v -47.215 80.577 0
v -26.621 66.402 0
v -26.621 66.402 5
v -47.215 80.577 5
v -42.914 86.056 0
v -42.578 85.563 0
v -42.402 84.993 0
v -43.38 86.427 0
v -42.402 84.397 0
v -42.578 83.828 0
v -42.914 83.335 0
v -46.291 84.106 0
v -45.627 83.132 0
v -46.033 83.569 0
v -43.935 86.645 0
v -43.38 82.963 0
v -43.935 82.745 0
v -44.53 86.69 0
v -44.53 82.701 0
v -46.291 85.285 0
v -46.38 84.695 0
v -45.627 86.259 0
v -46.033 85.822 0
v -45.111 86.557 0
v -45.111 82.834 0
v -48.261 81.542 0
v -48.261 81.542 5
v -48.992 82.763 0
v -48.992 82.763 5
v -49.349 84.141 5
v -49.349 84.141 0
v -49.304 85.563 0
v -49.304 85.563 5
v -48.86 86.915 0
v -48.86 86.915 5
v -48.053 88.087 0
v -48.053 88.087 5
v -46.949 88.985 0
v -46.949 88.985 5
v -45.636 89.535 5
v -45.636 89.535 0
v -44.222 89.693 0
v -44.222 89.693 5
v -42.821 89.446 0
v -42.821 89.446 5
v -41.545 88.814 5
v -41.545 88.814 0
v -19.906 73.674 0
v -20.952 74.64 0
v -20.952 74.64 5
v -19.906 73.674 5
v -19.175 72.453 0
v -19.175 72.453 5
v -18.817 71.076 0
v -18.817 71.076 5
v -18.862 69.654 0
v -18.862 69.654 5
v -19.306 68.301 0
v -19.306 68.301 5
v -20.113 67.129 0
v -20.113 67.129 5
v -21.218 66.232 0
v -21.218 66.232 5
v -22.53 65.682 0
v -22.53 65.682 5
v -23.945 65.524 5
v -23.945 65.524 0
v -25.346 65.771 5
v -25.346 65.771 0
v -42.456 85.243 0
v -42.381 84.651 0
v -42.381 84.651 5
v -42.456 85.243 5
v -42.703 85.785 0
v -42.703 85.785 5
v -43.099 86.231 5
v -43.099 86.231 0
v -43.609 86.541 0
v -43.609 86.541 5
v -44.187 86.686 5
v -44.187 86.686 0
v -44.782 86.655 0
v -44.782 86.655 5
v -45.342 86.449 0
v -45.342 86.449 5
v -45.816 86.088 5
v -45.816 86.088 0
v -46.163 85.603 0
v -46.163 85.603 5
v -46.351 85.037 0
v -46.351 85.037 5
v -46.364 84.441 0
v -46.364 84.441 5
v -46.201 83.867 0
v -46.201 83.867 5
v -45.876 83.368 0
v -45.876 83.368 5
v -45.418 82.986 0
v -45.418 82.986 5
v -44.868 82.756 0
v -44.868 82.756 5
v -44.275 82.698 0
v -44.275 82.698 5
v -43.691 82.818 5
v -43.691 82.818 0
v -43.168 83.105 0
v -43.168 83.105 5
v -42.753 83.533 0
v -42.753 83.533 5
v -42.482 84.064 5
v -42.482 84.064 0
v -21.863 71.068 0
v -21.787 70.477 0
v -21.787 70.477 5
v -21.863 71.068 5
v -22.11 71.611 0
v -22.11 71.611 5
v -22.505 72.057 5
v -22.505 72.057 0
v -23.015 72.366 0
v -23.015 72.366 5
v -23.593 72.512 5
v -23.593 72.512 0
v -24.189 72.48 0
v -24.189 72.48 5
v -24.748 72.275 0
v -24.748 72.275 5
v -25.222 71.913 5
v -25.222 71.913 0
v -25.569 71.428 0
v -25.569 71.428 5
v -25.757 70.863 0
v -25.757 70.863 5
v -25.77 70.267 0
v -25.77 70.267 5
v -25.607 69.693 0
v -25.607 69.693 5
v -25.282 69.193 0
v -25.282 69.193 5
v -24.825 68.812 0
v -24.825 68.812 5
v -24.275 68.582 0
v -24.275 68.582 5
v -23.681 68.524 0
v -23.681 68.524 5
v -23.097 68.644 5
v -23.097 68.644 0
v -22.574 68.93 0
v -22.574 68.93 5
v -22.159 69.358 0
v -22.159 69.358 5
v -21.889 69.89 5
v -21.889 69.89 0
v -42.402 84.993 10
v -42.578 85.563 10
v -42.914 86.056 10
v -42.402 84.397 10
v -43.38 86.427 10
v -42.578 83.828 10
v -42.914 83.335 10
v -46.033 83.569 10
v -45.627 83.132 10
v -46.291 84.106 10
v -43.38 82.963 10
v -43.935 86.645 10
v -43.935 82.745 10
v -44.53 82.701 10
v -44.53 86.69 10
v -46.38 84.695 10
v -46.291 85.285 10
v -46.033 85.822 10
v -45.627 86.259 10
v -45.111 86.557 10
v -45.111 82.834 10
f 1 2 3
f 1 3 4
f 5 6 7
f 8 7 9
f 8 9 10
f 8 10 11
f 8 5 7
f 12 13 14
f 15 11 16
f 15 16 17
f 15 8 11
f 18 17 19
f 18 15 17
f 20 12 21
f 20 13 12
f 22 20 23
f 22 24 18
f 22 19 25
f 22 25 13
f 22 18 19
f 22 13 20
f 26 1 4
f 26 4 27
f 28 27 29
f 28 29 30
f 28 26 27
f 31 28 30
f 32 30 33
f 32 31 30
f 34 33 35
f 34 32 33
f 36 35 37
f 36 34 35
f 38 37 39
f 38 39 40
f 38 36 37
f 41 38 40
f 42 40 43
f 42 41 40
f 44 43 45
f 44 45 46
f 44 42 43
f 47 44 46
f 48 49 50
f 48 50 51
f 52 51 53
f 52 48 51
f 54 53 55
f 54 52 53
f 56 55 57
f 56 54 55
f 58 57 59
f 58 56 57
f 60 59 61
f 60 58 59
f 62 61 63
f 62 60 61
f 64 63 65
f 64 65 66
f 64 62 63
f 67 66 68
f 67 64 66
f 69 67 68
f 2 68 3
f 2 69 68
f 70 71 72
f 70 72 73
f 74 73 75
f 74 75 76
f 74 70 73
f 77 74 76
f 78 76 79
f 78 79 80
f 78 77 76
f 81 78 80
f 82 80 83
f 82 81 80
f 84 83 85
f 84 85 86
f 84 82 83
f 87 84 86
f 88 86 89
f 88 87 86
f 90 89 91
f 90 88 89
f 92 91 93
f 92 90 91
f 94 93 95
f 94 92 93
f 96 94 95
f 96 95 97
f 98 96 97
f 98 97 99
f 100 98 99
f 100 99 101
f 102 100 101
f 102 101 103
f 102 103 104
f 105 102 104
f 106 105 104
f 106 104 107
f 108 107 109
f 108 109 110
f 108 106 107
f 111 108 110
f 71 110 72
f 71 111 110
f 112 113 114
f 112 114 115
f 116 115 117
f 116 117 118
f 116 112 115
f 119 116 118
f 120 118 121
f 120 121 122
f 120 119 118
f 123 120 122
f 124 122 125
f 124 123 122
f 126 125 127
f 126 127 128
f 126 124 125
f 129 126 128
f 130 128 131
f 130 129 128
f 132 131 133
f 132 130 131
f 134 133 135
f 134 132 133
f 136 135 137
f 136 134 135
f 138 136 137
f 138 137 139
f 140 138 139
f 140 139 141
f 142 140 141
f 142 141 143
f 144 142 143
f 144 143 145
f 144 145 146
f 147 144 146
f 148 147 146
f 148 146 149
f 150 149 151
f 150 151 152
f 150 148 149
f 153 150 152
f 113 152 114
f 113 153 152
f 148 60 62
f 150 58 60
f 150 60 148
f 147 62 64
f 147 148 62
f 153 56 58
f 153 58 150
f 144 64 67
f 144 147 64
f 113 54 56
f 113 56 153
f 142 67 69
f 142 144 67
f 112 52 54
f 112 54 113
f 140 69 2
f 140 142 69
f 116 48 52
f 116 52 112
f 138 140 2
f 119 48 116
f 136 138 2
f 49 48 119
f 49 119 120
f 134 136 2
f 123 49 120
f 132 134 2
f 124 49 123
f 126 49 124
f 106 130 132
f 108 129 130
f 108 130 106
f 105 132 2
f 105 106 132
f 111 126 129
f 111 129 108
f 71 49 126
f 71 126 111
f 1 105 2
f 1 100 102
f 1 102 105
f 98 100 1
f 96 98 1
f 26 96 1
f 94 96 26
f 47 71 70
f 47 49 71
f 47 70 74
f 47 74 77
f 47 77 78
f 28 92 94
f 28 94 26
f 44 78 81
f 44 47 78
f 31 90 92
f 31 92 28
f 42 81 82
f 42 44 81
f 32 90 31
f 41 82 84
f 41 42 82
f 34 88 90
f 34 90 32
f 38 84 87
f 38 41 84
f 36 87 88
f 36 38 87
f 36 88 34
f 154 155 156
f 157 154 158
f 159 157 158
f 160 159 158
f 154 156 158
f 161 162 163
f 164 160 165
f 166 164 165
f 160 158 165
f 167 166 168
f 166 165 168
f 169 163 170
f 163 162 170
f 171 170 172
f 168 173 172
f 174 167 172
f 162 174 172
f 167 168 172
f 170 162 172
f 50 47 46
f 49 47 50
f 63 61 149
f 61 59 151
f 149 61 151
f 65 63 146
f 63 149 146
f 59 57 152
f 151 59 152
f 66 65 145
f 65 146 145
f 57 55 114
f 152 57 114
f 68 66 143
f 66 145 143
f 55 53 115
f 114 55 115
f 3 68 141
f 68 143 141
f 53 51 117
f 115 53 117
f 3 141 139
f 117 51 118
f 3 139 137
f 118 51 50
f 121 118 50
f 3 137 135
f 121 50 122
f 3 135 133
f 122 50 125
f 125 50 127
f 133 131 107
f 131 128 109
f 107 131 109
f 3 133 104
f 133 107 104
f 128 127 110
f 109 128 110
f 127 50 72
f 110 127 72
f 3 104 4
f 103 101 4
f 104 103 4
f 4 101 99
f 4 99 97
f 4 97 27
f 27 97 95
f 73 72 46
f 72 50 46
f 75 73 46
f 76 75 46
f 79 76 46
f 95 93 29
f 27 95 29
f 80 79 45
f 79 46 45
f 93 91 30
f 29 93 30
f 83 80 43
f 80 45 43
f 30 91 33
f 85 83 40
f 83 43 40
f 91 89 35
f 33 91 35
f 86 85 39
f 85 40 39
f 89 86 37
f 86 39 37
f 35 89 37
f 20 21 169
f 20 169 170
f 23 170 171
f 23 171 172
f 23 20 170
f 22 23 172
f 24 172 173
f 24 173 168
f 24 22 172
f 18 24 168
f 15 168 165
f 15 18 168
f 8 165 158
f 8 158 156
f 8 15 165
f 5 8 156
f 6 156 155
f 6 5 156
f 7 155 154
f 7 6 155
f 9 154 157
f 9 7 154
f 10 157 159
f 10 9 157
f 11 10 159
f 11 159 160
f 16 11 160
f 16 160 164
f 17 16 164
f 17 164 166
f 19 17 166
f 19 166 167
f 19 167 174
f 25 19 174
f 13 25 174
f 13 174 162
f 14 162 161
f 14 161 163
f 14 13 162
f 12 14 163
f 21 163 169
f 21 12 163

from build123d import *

# Parameters (mm, degrees)
SKETCH1_R           = 2
BOSS_EXTRUDE1_DEPTH = 5
SKETCH2_R           = 2
BOSS_EXTRUDE2_DEPTH = 10


with BuildPart() as part:
    # Sketch1 → Boss-Extrude1 (new body)
    with BuildSketch(Plane(origin=(0, 0, 0), x_dir=(0.999757303, -0.022030336, 0), z_dir=(0, 0, 1))):
        with BuildLine():
            Line((-43.491829272, 87.877240738), (-22.59104637, 74.16019754))
            ThreePointArc((-22.59104637, 74.16019754), (-21.15429843, 67.23663232), (-28.077863649, 65.799884379))
            Line((-28.077863649, 65.799884379), (-48.978646551, 79.516927577))
            ThreePointArc((-48.978646551, 79.516927577), (-50.415394492, 86.440492797), (-43.491829272, 87.877240738))
        make_face()
        with Locations((-25.33445501, 69.980040959)):
            Circle(SKETCH1_R, mode=Mode.SUBTRACT)
        with Locations((-46.235237911, 83.697084158)):
            Circle(SKETCH1_R, mode=Mode.SUBTRACT)
    extrude(amount=BOSS_EXTRUDE1_DEPTH)


with BuildPart() as body_2:
    # Sketch2 → Boss-Extrude2 (new body)
    with BuildSketch(Plane(origin=(0, 0, 0), x_dir=(-1, 0, 0), z_dir=(0, 0, -1))):
        with Locations((44.380141864, 84.695348924)):
            Circle(SKETCH2_R)
    extrude(amount=-BOSS_EXTRUDE2_DEPTH)


solid = Compound([part.part, body_2.part])
